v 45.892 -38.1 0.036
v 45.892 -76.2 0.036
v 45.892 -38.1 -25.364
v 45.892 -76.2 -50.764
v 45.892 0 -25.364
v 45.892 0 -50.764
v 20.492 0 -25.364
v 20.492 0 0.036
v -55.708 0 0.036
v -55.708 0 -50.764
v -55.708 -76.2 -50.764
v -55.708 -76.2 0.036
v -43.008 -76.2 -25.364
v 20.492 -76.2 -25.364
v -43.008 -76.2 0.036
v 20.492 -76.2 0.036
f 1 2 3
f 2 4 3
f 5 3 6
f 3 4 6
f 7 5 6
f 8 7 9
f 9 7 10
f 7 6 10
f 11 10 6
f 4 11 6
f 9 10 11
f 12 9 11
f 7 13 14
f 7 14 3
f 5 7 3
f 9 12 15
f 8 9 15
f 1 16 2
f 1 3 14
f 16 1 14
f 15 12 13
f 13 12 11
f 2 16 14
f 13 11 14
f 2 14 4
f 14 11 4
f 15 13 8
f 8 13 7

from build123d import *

# Parameters (mm, degrees)
F0_W     = 101.6
F0_H     = 25.4
F1_DEPTH = 76.2
F3_DEPTH = 25.4
F5_DEPTH = 25.4


with BuildPart() as f1:
    # F0 (on Front) → F1 (new body)
    with BuildSketch(Plane.XZ):
        with Locations((-4.908444, -38.063884)):
            Rectangle(F0_W, F0_H)
    extrude(amount=F1_DEPTH)

    # F2 (on face) → F3 (join)
    with BuildSketch(Plane.XY.offset(-25.363884)):
        Polygon((20.491556, -76.2), (45.891556, -76.2), (45.891556, -38.1), align=None)
    extrude(amount=F3_DEPTH)

    # F4 (on face) → F5 (join)
    with BuildSketch(Plane.XY.offset(-25.363884)):
        Polygon((-55.708444, 0), (-55.708444, -76.2), (-43.008444, -76.2), (20.491556, 0), align=None)
    extrude(amount=F5_DEPTH)


solid = f1.part
